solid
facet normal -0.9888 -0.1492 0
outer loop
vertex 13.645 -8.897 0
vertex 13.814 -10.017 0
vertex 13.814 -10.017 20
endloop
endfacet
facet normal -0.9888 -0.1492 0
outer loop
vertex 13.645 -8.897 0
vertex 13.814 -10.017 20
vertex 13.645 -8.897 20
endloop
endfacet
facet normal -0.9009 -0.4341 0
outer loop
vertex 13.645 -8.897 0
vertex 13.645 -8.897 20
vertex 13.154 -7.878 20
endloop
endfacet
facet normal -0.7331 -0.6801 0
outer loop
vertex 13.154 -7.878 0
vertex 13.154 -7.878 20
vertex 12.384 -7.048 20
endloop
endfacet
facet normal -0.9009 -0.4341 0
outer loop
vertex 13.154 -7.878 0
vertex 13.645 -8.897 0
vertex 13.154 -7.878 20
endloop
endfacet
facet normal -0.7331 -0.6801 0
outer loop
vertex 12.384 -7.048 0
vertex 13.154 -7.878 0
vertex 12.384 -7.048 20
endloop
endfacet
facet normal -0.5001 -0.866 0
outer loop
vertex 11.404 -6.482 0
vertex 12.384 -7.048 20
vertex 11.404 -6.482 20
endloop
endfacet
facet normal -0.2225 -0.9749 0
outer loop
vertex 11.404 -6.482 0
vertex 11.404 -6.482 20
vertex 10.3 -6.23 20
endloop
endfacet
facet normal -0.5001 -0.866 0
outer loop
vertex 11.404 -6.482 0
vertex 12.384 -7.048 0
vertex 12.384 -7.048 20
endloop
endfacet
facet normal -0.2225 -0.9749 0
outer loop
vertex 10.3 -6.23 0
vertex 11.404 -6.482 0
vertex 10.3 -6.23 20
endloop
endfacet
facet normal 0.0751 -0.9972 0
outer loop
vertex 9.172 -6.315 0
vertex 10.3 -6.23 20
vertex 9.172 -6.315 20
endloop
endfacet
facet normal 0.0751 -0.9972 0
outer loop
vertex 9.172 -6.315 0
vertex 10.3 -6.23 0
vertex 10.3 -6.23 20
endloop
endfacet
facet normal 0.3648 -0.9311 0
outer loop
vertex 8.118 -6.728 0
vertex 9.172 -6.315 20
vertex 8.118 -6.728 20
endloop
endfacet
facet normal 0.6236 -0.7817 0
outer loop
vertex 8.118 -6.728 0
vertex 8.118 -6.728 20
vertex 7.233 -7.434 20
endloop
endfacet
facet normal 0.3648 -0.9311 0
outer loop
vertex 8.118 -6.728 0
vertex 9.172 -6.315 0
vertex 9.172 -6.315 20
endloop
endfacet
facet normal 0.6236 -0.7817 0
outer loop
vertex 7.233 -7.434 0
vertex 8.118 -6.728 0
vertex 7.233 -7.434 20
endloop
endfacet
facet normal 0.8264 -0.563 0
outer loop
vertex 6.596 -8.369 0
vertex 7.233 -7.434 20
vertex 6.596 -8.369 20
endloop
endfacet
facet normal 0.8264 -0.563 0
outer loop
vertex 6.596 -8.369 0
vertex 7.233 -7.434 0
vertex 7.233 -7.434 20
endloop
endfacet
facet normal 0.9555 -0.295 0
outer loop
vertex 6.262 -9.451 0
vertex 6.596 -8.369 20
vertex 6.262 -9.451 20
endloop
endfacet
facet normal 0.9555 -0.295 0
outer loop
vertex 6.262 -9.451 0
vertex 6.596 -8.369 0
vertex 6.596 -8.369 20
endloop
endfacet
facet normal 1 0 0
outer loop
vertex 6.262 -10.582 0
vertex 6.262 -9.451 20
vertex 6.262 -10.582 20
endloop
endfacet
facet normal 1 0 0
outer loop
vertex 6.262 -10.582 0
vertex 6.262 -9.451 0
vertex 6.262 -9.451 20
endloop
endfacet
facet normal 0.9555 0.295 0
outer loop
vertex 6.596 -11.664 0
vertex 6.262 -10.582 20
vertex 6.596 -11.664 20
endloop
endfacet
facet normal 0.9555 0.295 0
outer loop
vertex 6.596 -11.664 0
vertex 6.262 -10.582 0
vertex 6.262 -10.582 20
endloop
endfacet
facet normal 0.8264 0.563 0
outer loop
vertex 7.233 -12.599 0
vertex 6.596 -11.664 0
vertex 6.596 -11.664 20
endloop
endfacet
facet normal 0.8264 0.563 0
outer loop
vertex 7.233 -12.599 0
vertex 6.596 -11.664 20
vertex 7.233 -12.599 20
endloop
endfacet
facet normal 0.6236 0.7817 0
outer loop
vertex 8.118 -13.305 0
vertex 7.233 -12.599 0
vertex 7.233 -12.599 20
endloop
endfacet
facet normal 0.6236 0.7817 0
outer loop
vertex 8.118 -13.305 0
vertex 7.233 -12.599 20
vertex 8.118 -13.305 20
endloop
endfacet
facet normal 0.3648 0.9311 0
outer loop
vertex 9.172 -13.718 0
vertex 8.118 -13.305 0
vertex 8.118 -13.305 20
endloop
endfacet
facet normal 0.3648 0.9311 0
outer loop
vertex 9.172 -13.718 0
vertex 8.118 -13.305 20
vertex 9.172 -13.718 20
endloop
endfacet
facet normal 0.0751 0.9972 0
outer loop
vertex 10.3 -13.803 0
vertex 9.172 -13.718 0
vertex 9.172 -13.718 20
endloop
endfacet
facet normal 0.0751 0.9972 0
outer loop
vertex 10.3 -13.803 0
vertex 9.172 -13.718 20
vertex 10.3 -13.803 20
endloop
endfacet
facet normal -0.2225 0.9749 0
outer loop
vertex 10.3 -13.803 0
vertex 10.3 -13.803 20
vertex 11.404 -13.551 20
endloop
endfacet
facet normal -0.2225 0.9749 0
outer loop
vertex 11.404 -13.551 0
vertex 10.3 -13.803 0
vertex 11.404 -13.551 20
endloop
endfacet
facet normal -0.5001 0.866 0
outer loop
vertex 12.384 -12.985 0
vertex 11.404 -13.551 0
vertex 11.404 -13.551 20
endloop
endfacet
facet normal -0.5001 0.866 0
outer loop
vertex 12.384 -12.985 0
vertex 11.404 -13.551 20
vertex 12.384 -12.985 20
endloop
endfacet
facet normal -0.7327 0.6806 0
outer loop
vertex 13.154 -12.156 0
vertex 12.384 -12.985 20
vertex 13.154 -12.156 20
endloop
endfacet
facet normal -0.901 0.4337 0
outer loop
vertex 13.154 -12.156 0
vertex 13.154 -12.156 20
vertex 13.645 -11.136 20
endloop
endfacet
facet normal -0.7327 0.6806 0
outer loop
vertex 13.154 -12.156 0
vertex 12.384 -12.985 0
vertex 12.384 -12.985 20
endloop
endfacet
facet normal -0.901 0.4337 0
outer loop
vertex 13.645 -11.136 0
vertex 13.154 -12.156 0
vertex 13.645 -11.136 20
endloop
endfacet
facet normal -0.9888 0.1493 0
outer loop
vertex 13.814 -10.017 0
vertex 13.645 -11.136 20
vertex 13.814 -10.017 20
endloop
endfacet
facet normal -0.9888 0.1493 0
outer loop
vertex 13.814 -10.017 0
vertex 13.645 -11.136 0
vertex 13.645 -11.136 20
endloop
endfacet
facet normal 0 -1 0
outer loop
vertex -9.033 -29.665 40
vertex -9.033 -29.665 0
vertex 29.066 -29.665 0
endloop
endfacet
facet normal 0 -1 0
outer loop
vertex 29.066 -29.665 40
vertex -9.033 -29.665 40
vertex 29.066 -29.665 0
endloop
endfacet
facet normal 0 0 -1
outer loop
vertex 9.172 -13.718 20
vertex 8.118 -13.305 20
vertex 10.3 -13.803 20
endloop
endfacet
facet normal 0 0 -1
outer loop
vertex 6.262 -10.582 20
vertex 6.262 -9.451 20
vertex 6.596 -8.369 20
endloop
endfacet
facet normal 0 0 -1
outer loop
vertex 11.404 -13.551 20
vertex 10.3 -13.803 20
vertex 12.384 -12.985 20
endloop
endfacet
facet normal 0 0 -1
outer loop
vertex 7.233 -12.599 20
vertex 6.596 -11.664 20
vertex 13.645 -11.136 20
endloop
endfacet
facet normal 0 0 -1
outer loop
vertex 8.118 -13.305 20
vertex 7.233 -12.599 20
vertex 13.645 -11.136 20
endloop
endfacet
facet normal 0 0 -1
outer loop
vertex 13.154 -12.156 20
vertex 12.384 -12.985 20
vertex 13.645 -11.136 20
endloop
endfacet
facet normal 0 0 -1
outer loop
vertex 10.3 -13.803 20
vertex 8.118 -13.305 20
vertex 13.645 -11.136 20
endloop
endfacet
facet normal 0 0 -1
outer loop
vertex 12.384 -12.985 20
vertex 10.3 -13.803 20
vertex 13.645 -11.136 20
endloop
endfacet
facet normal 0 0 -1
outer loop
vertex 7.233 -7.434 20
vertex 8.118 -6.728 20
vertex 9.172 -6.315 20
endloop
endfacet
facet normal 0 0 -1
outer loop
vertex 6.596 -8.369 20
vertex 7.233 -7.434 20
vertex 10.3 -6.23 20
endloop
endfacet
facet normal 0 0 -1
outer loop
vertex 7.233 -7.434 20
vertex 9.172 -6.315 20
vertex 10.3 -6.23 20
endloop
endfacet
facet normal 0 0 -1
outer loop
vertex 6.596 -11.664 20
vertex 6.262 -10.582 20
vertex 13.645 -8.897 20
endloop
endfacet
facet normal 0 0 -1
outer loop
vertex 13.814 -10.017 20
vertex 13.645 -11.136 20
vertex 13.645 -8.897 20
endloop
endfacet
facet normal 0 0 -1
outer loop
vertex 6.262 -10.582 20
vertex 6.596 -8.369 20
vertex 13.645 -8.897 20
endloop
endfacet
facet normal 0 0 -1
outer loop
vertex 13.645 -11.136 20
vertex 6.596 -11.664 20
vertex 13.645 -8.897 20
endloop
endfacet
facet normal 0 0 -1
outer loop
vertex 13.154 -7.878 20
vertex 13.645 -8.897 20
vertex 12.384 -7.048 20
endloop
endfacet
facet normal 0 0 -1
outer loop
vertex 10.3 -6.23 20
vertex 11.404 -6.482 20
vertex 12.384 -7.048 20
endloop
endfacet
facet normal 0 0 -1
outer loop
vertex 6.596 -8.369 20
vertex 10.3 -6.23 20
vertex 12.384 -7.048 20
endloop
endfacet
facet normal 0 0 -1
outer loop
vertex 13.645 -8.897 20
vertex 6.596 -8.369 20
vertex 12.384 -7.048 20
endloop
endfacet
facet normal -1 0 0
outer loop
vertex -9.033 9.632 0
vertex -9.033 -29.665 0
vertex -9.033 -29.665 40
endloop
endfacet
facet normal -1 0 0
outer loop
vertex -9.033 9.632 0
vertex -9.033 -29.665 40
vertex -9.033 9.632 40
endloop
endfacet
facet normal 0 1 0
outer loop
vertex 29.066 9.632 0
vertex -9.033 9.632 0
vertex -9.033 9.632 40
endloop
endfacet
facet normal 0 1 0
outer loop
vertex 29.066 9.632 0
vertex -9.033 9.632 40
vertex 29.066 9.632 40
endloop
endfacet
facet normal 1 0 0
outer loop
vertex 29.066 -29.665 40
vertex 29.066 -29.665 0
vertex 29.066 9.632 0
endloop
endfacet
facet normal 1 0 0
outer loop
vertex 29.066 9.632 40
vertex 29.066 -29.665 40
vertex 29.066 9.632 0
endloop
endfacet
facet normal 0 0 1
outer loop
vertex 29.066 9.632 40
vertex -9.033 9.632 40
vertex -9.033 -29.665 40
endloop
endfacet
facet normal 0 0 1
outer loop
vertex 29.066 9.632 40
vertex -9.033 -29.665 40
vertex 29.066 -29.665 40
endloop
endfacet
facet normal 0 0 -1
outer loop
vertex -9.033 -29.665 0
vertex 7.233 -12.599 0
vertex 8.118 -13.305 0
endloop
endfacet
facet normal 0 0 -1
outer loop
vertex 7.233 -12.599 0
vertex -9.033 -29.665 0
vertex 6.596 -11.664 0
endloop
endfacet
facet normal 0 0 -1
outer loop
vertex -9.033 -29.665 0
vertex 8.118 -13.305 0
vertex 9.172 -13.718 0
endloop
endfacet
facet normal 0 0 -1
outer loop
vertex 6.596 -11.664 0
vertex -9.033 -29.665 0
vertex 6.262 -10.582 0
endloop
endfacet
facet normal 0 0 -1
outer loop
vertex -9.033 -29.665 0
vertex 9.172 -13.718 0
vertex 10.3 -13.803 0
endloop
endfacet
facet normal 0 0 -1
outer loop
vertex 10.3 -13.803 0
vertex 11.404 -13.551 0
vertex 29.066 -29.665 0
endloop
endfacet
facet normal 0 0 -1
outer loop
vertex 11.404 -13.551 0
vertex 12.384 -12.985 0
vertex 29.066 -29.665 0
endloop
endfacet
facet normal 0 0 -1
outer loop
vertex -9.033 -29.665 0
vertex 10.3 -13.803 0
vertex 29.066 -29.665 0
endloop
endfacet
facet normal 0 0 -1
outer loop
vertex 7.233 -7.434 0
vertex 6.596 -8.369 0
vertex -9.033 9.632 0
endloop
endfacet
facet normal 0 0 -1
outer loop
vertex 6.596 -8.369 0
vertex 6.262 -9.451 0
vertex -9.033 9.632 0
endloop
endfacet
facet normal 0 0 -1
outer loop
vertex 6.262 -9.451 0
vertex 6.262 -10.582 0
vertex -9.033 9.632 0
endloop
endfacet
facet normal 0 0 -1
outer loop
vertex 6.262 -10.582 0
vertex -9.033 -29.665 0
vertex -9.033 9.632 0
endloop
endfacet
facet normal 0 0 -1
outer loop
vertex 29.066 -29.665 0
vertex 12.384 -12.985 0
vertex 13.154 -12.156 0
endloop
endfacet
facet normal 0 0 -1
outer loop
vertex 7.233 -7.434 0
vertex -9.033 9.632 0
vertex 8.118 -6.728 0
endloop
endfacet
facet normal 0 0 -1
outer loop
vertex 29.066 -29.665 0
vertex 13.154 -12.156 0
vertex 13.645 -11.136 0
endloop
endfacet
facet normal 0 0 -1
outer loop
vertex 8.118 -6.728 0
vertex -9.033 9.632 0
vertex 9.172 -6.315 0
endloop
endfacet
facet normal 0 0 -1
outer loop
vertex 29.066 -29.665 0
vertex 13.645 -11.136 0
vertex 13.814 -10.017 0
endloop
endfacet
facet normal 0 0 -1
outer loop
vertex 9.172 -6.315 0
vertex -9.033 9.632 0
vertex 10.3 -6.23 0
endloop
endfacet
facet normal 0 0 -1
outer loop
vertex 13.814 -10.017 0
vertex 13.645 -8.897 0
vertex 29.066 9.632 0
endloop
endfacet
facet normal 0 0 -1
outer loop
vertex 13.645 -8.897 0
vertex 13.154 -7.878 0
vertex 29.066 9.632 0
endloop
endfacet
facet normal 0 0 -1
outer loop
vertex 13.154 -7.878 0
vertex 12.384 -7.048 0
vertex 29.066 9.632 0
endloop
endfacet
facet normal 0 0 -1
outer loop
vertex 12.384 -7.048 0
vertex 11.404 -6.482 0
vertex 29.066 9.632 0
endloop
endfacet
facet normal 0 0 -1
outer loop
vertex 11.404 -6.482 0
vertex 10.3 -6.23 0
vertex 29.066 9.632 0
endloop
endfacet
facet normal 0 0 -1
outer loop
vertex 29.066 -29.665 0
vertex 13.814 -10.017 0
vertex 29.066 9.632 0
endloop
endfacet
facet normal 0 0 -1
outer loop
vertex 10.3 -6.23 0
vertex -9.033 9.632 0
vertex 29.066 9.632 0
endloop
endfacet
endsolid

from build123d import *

# Parameters (mm, degrees)
SKETCH1_W           = 38.09940225
SKETCH1_H           = 39.297540676
BOSS_EXTRUDE1_DEPTH = 40
SKETCH1_3_R         = 3.7970867
CUT_EXTRUDE1_DEPTH  = 20


with BuildPart() as part:
    # Sketch1 → Boss-Extrude1 (new body)
    with BuildSketch(Plane.XY):
        with Locations((10.016557459, -10.016557459)):
            Rectangle(SKETCH1_W, SKETCH1_H)
    extrude(amount=BOSS_EXTRUDE1_DEPTH)

    # Sketch1<3> → Cut-Extrude1 (cut)
    with BuildSketch(Plane.XY):
        with Locations((10.016557459, -10.016557459)):
            Circle(SKETCH1_3_R)
    extrude(amount=CUT_EXTRUDE1_DEPTH, mode=Mode.SUBTRACT)


solid = part.part
